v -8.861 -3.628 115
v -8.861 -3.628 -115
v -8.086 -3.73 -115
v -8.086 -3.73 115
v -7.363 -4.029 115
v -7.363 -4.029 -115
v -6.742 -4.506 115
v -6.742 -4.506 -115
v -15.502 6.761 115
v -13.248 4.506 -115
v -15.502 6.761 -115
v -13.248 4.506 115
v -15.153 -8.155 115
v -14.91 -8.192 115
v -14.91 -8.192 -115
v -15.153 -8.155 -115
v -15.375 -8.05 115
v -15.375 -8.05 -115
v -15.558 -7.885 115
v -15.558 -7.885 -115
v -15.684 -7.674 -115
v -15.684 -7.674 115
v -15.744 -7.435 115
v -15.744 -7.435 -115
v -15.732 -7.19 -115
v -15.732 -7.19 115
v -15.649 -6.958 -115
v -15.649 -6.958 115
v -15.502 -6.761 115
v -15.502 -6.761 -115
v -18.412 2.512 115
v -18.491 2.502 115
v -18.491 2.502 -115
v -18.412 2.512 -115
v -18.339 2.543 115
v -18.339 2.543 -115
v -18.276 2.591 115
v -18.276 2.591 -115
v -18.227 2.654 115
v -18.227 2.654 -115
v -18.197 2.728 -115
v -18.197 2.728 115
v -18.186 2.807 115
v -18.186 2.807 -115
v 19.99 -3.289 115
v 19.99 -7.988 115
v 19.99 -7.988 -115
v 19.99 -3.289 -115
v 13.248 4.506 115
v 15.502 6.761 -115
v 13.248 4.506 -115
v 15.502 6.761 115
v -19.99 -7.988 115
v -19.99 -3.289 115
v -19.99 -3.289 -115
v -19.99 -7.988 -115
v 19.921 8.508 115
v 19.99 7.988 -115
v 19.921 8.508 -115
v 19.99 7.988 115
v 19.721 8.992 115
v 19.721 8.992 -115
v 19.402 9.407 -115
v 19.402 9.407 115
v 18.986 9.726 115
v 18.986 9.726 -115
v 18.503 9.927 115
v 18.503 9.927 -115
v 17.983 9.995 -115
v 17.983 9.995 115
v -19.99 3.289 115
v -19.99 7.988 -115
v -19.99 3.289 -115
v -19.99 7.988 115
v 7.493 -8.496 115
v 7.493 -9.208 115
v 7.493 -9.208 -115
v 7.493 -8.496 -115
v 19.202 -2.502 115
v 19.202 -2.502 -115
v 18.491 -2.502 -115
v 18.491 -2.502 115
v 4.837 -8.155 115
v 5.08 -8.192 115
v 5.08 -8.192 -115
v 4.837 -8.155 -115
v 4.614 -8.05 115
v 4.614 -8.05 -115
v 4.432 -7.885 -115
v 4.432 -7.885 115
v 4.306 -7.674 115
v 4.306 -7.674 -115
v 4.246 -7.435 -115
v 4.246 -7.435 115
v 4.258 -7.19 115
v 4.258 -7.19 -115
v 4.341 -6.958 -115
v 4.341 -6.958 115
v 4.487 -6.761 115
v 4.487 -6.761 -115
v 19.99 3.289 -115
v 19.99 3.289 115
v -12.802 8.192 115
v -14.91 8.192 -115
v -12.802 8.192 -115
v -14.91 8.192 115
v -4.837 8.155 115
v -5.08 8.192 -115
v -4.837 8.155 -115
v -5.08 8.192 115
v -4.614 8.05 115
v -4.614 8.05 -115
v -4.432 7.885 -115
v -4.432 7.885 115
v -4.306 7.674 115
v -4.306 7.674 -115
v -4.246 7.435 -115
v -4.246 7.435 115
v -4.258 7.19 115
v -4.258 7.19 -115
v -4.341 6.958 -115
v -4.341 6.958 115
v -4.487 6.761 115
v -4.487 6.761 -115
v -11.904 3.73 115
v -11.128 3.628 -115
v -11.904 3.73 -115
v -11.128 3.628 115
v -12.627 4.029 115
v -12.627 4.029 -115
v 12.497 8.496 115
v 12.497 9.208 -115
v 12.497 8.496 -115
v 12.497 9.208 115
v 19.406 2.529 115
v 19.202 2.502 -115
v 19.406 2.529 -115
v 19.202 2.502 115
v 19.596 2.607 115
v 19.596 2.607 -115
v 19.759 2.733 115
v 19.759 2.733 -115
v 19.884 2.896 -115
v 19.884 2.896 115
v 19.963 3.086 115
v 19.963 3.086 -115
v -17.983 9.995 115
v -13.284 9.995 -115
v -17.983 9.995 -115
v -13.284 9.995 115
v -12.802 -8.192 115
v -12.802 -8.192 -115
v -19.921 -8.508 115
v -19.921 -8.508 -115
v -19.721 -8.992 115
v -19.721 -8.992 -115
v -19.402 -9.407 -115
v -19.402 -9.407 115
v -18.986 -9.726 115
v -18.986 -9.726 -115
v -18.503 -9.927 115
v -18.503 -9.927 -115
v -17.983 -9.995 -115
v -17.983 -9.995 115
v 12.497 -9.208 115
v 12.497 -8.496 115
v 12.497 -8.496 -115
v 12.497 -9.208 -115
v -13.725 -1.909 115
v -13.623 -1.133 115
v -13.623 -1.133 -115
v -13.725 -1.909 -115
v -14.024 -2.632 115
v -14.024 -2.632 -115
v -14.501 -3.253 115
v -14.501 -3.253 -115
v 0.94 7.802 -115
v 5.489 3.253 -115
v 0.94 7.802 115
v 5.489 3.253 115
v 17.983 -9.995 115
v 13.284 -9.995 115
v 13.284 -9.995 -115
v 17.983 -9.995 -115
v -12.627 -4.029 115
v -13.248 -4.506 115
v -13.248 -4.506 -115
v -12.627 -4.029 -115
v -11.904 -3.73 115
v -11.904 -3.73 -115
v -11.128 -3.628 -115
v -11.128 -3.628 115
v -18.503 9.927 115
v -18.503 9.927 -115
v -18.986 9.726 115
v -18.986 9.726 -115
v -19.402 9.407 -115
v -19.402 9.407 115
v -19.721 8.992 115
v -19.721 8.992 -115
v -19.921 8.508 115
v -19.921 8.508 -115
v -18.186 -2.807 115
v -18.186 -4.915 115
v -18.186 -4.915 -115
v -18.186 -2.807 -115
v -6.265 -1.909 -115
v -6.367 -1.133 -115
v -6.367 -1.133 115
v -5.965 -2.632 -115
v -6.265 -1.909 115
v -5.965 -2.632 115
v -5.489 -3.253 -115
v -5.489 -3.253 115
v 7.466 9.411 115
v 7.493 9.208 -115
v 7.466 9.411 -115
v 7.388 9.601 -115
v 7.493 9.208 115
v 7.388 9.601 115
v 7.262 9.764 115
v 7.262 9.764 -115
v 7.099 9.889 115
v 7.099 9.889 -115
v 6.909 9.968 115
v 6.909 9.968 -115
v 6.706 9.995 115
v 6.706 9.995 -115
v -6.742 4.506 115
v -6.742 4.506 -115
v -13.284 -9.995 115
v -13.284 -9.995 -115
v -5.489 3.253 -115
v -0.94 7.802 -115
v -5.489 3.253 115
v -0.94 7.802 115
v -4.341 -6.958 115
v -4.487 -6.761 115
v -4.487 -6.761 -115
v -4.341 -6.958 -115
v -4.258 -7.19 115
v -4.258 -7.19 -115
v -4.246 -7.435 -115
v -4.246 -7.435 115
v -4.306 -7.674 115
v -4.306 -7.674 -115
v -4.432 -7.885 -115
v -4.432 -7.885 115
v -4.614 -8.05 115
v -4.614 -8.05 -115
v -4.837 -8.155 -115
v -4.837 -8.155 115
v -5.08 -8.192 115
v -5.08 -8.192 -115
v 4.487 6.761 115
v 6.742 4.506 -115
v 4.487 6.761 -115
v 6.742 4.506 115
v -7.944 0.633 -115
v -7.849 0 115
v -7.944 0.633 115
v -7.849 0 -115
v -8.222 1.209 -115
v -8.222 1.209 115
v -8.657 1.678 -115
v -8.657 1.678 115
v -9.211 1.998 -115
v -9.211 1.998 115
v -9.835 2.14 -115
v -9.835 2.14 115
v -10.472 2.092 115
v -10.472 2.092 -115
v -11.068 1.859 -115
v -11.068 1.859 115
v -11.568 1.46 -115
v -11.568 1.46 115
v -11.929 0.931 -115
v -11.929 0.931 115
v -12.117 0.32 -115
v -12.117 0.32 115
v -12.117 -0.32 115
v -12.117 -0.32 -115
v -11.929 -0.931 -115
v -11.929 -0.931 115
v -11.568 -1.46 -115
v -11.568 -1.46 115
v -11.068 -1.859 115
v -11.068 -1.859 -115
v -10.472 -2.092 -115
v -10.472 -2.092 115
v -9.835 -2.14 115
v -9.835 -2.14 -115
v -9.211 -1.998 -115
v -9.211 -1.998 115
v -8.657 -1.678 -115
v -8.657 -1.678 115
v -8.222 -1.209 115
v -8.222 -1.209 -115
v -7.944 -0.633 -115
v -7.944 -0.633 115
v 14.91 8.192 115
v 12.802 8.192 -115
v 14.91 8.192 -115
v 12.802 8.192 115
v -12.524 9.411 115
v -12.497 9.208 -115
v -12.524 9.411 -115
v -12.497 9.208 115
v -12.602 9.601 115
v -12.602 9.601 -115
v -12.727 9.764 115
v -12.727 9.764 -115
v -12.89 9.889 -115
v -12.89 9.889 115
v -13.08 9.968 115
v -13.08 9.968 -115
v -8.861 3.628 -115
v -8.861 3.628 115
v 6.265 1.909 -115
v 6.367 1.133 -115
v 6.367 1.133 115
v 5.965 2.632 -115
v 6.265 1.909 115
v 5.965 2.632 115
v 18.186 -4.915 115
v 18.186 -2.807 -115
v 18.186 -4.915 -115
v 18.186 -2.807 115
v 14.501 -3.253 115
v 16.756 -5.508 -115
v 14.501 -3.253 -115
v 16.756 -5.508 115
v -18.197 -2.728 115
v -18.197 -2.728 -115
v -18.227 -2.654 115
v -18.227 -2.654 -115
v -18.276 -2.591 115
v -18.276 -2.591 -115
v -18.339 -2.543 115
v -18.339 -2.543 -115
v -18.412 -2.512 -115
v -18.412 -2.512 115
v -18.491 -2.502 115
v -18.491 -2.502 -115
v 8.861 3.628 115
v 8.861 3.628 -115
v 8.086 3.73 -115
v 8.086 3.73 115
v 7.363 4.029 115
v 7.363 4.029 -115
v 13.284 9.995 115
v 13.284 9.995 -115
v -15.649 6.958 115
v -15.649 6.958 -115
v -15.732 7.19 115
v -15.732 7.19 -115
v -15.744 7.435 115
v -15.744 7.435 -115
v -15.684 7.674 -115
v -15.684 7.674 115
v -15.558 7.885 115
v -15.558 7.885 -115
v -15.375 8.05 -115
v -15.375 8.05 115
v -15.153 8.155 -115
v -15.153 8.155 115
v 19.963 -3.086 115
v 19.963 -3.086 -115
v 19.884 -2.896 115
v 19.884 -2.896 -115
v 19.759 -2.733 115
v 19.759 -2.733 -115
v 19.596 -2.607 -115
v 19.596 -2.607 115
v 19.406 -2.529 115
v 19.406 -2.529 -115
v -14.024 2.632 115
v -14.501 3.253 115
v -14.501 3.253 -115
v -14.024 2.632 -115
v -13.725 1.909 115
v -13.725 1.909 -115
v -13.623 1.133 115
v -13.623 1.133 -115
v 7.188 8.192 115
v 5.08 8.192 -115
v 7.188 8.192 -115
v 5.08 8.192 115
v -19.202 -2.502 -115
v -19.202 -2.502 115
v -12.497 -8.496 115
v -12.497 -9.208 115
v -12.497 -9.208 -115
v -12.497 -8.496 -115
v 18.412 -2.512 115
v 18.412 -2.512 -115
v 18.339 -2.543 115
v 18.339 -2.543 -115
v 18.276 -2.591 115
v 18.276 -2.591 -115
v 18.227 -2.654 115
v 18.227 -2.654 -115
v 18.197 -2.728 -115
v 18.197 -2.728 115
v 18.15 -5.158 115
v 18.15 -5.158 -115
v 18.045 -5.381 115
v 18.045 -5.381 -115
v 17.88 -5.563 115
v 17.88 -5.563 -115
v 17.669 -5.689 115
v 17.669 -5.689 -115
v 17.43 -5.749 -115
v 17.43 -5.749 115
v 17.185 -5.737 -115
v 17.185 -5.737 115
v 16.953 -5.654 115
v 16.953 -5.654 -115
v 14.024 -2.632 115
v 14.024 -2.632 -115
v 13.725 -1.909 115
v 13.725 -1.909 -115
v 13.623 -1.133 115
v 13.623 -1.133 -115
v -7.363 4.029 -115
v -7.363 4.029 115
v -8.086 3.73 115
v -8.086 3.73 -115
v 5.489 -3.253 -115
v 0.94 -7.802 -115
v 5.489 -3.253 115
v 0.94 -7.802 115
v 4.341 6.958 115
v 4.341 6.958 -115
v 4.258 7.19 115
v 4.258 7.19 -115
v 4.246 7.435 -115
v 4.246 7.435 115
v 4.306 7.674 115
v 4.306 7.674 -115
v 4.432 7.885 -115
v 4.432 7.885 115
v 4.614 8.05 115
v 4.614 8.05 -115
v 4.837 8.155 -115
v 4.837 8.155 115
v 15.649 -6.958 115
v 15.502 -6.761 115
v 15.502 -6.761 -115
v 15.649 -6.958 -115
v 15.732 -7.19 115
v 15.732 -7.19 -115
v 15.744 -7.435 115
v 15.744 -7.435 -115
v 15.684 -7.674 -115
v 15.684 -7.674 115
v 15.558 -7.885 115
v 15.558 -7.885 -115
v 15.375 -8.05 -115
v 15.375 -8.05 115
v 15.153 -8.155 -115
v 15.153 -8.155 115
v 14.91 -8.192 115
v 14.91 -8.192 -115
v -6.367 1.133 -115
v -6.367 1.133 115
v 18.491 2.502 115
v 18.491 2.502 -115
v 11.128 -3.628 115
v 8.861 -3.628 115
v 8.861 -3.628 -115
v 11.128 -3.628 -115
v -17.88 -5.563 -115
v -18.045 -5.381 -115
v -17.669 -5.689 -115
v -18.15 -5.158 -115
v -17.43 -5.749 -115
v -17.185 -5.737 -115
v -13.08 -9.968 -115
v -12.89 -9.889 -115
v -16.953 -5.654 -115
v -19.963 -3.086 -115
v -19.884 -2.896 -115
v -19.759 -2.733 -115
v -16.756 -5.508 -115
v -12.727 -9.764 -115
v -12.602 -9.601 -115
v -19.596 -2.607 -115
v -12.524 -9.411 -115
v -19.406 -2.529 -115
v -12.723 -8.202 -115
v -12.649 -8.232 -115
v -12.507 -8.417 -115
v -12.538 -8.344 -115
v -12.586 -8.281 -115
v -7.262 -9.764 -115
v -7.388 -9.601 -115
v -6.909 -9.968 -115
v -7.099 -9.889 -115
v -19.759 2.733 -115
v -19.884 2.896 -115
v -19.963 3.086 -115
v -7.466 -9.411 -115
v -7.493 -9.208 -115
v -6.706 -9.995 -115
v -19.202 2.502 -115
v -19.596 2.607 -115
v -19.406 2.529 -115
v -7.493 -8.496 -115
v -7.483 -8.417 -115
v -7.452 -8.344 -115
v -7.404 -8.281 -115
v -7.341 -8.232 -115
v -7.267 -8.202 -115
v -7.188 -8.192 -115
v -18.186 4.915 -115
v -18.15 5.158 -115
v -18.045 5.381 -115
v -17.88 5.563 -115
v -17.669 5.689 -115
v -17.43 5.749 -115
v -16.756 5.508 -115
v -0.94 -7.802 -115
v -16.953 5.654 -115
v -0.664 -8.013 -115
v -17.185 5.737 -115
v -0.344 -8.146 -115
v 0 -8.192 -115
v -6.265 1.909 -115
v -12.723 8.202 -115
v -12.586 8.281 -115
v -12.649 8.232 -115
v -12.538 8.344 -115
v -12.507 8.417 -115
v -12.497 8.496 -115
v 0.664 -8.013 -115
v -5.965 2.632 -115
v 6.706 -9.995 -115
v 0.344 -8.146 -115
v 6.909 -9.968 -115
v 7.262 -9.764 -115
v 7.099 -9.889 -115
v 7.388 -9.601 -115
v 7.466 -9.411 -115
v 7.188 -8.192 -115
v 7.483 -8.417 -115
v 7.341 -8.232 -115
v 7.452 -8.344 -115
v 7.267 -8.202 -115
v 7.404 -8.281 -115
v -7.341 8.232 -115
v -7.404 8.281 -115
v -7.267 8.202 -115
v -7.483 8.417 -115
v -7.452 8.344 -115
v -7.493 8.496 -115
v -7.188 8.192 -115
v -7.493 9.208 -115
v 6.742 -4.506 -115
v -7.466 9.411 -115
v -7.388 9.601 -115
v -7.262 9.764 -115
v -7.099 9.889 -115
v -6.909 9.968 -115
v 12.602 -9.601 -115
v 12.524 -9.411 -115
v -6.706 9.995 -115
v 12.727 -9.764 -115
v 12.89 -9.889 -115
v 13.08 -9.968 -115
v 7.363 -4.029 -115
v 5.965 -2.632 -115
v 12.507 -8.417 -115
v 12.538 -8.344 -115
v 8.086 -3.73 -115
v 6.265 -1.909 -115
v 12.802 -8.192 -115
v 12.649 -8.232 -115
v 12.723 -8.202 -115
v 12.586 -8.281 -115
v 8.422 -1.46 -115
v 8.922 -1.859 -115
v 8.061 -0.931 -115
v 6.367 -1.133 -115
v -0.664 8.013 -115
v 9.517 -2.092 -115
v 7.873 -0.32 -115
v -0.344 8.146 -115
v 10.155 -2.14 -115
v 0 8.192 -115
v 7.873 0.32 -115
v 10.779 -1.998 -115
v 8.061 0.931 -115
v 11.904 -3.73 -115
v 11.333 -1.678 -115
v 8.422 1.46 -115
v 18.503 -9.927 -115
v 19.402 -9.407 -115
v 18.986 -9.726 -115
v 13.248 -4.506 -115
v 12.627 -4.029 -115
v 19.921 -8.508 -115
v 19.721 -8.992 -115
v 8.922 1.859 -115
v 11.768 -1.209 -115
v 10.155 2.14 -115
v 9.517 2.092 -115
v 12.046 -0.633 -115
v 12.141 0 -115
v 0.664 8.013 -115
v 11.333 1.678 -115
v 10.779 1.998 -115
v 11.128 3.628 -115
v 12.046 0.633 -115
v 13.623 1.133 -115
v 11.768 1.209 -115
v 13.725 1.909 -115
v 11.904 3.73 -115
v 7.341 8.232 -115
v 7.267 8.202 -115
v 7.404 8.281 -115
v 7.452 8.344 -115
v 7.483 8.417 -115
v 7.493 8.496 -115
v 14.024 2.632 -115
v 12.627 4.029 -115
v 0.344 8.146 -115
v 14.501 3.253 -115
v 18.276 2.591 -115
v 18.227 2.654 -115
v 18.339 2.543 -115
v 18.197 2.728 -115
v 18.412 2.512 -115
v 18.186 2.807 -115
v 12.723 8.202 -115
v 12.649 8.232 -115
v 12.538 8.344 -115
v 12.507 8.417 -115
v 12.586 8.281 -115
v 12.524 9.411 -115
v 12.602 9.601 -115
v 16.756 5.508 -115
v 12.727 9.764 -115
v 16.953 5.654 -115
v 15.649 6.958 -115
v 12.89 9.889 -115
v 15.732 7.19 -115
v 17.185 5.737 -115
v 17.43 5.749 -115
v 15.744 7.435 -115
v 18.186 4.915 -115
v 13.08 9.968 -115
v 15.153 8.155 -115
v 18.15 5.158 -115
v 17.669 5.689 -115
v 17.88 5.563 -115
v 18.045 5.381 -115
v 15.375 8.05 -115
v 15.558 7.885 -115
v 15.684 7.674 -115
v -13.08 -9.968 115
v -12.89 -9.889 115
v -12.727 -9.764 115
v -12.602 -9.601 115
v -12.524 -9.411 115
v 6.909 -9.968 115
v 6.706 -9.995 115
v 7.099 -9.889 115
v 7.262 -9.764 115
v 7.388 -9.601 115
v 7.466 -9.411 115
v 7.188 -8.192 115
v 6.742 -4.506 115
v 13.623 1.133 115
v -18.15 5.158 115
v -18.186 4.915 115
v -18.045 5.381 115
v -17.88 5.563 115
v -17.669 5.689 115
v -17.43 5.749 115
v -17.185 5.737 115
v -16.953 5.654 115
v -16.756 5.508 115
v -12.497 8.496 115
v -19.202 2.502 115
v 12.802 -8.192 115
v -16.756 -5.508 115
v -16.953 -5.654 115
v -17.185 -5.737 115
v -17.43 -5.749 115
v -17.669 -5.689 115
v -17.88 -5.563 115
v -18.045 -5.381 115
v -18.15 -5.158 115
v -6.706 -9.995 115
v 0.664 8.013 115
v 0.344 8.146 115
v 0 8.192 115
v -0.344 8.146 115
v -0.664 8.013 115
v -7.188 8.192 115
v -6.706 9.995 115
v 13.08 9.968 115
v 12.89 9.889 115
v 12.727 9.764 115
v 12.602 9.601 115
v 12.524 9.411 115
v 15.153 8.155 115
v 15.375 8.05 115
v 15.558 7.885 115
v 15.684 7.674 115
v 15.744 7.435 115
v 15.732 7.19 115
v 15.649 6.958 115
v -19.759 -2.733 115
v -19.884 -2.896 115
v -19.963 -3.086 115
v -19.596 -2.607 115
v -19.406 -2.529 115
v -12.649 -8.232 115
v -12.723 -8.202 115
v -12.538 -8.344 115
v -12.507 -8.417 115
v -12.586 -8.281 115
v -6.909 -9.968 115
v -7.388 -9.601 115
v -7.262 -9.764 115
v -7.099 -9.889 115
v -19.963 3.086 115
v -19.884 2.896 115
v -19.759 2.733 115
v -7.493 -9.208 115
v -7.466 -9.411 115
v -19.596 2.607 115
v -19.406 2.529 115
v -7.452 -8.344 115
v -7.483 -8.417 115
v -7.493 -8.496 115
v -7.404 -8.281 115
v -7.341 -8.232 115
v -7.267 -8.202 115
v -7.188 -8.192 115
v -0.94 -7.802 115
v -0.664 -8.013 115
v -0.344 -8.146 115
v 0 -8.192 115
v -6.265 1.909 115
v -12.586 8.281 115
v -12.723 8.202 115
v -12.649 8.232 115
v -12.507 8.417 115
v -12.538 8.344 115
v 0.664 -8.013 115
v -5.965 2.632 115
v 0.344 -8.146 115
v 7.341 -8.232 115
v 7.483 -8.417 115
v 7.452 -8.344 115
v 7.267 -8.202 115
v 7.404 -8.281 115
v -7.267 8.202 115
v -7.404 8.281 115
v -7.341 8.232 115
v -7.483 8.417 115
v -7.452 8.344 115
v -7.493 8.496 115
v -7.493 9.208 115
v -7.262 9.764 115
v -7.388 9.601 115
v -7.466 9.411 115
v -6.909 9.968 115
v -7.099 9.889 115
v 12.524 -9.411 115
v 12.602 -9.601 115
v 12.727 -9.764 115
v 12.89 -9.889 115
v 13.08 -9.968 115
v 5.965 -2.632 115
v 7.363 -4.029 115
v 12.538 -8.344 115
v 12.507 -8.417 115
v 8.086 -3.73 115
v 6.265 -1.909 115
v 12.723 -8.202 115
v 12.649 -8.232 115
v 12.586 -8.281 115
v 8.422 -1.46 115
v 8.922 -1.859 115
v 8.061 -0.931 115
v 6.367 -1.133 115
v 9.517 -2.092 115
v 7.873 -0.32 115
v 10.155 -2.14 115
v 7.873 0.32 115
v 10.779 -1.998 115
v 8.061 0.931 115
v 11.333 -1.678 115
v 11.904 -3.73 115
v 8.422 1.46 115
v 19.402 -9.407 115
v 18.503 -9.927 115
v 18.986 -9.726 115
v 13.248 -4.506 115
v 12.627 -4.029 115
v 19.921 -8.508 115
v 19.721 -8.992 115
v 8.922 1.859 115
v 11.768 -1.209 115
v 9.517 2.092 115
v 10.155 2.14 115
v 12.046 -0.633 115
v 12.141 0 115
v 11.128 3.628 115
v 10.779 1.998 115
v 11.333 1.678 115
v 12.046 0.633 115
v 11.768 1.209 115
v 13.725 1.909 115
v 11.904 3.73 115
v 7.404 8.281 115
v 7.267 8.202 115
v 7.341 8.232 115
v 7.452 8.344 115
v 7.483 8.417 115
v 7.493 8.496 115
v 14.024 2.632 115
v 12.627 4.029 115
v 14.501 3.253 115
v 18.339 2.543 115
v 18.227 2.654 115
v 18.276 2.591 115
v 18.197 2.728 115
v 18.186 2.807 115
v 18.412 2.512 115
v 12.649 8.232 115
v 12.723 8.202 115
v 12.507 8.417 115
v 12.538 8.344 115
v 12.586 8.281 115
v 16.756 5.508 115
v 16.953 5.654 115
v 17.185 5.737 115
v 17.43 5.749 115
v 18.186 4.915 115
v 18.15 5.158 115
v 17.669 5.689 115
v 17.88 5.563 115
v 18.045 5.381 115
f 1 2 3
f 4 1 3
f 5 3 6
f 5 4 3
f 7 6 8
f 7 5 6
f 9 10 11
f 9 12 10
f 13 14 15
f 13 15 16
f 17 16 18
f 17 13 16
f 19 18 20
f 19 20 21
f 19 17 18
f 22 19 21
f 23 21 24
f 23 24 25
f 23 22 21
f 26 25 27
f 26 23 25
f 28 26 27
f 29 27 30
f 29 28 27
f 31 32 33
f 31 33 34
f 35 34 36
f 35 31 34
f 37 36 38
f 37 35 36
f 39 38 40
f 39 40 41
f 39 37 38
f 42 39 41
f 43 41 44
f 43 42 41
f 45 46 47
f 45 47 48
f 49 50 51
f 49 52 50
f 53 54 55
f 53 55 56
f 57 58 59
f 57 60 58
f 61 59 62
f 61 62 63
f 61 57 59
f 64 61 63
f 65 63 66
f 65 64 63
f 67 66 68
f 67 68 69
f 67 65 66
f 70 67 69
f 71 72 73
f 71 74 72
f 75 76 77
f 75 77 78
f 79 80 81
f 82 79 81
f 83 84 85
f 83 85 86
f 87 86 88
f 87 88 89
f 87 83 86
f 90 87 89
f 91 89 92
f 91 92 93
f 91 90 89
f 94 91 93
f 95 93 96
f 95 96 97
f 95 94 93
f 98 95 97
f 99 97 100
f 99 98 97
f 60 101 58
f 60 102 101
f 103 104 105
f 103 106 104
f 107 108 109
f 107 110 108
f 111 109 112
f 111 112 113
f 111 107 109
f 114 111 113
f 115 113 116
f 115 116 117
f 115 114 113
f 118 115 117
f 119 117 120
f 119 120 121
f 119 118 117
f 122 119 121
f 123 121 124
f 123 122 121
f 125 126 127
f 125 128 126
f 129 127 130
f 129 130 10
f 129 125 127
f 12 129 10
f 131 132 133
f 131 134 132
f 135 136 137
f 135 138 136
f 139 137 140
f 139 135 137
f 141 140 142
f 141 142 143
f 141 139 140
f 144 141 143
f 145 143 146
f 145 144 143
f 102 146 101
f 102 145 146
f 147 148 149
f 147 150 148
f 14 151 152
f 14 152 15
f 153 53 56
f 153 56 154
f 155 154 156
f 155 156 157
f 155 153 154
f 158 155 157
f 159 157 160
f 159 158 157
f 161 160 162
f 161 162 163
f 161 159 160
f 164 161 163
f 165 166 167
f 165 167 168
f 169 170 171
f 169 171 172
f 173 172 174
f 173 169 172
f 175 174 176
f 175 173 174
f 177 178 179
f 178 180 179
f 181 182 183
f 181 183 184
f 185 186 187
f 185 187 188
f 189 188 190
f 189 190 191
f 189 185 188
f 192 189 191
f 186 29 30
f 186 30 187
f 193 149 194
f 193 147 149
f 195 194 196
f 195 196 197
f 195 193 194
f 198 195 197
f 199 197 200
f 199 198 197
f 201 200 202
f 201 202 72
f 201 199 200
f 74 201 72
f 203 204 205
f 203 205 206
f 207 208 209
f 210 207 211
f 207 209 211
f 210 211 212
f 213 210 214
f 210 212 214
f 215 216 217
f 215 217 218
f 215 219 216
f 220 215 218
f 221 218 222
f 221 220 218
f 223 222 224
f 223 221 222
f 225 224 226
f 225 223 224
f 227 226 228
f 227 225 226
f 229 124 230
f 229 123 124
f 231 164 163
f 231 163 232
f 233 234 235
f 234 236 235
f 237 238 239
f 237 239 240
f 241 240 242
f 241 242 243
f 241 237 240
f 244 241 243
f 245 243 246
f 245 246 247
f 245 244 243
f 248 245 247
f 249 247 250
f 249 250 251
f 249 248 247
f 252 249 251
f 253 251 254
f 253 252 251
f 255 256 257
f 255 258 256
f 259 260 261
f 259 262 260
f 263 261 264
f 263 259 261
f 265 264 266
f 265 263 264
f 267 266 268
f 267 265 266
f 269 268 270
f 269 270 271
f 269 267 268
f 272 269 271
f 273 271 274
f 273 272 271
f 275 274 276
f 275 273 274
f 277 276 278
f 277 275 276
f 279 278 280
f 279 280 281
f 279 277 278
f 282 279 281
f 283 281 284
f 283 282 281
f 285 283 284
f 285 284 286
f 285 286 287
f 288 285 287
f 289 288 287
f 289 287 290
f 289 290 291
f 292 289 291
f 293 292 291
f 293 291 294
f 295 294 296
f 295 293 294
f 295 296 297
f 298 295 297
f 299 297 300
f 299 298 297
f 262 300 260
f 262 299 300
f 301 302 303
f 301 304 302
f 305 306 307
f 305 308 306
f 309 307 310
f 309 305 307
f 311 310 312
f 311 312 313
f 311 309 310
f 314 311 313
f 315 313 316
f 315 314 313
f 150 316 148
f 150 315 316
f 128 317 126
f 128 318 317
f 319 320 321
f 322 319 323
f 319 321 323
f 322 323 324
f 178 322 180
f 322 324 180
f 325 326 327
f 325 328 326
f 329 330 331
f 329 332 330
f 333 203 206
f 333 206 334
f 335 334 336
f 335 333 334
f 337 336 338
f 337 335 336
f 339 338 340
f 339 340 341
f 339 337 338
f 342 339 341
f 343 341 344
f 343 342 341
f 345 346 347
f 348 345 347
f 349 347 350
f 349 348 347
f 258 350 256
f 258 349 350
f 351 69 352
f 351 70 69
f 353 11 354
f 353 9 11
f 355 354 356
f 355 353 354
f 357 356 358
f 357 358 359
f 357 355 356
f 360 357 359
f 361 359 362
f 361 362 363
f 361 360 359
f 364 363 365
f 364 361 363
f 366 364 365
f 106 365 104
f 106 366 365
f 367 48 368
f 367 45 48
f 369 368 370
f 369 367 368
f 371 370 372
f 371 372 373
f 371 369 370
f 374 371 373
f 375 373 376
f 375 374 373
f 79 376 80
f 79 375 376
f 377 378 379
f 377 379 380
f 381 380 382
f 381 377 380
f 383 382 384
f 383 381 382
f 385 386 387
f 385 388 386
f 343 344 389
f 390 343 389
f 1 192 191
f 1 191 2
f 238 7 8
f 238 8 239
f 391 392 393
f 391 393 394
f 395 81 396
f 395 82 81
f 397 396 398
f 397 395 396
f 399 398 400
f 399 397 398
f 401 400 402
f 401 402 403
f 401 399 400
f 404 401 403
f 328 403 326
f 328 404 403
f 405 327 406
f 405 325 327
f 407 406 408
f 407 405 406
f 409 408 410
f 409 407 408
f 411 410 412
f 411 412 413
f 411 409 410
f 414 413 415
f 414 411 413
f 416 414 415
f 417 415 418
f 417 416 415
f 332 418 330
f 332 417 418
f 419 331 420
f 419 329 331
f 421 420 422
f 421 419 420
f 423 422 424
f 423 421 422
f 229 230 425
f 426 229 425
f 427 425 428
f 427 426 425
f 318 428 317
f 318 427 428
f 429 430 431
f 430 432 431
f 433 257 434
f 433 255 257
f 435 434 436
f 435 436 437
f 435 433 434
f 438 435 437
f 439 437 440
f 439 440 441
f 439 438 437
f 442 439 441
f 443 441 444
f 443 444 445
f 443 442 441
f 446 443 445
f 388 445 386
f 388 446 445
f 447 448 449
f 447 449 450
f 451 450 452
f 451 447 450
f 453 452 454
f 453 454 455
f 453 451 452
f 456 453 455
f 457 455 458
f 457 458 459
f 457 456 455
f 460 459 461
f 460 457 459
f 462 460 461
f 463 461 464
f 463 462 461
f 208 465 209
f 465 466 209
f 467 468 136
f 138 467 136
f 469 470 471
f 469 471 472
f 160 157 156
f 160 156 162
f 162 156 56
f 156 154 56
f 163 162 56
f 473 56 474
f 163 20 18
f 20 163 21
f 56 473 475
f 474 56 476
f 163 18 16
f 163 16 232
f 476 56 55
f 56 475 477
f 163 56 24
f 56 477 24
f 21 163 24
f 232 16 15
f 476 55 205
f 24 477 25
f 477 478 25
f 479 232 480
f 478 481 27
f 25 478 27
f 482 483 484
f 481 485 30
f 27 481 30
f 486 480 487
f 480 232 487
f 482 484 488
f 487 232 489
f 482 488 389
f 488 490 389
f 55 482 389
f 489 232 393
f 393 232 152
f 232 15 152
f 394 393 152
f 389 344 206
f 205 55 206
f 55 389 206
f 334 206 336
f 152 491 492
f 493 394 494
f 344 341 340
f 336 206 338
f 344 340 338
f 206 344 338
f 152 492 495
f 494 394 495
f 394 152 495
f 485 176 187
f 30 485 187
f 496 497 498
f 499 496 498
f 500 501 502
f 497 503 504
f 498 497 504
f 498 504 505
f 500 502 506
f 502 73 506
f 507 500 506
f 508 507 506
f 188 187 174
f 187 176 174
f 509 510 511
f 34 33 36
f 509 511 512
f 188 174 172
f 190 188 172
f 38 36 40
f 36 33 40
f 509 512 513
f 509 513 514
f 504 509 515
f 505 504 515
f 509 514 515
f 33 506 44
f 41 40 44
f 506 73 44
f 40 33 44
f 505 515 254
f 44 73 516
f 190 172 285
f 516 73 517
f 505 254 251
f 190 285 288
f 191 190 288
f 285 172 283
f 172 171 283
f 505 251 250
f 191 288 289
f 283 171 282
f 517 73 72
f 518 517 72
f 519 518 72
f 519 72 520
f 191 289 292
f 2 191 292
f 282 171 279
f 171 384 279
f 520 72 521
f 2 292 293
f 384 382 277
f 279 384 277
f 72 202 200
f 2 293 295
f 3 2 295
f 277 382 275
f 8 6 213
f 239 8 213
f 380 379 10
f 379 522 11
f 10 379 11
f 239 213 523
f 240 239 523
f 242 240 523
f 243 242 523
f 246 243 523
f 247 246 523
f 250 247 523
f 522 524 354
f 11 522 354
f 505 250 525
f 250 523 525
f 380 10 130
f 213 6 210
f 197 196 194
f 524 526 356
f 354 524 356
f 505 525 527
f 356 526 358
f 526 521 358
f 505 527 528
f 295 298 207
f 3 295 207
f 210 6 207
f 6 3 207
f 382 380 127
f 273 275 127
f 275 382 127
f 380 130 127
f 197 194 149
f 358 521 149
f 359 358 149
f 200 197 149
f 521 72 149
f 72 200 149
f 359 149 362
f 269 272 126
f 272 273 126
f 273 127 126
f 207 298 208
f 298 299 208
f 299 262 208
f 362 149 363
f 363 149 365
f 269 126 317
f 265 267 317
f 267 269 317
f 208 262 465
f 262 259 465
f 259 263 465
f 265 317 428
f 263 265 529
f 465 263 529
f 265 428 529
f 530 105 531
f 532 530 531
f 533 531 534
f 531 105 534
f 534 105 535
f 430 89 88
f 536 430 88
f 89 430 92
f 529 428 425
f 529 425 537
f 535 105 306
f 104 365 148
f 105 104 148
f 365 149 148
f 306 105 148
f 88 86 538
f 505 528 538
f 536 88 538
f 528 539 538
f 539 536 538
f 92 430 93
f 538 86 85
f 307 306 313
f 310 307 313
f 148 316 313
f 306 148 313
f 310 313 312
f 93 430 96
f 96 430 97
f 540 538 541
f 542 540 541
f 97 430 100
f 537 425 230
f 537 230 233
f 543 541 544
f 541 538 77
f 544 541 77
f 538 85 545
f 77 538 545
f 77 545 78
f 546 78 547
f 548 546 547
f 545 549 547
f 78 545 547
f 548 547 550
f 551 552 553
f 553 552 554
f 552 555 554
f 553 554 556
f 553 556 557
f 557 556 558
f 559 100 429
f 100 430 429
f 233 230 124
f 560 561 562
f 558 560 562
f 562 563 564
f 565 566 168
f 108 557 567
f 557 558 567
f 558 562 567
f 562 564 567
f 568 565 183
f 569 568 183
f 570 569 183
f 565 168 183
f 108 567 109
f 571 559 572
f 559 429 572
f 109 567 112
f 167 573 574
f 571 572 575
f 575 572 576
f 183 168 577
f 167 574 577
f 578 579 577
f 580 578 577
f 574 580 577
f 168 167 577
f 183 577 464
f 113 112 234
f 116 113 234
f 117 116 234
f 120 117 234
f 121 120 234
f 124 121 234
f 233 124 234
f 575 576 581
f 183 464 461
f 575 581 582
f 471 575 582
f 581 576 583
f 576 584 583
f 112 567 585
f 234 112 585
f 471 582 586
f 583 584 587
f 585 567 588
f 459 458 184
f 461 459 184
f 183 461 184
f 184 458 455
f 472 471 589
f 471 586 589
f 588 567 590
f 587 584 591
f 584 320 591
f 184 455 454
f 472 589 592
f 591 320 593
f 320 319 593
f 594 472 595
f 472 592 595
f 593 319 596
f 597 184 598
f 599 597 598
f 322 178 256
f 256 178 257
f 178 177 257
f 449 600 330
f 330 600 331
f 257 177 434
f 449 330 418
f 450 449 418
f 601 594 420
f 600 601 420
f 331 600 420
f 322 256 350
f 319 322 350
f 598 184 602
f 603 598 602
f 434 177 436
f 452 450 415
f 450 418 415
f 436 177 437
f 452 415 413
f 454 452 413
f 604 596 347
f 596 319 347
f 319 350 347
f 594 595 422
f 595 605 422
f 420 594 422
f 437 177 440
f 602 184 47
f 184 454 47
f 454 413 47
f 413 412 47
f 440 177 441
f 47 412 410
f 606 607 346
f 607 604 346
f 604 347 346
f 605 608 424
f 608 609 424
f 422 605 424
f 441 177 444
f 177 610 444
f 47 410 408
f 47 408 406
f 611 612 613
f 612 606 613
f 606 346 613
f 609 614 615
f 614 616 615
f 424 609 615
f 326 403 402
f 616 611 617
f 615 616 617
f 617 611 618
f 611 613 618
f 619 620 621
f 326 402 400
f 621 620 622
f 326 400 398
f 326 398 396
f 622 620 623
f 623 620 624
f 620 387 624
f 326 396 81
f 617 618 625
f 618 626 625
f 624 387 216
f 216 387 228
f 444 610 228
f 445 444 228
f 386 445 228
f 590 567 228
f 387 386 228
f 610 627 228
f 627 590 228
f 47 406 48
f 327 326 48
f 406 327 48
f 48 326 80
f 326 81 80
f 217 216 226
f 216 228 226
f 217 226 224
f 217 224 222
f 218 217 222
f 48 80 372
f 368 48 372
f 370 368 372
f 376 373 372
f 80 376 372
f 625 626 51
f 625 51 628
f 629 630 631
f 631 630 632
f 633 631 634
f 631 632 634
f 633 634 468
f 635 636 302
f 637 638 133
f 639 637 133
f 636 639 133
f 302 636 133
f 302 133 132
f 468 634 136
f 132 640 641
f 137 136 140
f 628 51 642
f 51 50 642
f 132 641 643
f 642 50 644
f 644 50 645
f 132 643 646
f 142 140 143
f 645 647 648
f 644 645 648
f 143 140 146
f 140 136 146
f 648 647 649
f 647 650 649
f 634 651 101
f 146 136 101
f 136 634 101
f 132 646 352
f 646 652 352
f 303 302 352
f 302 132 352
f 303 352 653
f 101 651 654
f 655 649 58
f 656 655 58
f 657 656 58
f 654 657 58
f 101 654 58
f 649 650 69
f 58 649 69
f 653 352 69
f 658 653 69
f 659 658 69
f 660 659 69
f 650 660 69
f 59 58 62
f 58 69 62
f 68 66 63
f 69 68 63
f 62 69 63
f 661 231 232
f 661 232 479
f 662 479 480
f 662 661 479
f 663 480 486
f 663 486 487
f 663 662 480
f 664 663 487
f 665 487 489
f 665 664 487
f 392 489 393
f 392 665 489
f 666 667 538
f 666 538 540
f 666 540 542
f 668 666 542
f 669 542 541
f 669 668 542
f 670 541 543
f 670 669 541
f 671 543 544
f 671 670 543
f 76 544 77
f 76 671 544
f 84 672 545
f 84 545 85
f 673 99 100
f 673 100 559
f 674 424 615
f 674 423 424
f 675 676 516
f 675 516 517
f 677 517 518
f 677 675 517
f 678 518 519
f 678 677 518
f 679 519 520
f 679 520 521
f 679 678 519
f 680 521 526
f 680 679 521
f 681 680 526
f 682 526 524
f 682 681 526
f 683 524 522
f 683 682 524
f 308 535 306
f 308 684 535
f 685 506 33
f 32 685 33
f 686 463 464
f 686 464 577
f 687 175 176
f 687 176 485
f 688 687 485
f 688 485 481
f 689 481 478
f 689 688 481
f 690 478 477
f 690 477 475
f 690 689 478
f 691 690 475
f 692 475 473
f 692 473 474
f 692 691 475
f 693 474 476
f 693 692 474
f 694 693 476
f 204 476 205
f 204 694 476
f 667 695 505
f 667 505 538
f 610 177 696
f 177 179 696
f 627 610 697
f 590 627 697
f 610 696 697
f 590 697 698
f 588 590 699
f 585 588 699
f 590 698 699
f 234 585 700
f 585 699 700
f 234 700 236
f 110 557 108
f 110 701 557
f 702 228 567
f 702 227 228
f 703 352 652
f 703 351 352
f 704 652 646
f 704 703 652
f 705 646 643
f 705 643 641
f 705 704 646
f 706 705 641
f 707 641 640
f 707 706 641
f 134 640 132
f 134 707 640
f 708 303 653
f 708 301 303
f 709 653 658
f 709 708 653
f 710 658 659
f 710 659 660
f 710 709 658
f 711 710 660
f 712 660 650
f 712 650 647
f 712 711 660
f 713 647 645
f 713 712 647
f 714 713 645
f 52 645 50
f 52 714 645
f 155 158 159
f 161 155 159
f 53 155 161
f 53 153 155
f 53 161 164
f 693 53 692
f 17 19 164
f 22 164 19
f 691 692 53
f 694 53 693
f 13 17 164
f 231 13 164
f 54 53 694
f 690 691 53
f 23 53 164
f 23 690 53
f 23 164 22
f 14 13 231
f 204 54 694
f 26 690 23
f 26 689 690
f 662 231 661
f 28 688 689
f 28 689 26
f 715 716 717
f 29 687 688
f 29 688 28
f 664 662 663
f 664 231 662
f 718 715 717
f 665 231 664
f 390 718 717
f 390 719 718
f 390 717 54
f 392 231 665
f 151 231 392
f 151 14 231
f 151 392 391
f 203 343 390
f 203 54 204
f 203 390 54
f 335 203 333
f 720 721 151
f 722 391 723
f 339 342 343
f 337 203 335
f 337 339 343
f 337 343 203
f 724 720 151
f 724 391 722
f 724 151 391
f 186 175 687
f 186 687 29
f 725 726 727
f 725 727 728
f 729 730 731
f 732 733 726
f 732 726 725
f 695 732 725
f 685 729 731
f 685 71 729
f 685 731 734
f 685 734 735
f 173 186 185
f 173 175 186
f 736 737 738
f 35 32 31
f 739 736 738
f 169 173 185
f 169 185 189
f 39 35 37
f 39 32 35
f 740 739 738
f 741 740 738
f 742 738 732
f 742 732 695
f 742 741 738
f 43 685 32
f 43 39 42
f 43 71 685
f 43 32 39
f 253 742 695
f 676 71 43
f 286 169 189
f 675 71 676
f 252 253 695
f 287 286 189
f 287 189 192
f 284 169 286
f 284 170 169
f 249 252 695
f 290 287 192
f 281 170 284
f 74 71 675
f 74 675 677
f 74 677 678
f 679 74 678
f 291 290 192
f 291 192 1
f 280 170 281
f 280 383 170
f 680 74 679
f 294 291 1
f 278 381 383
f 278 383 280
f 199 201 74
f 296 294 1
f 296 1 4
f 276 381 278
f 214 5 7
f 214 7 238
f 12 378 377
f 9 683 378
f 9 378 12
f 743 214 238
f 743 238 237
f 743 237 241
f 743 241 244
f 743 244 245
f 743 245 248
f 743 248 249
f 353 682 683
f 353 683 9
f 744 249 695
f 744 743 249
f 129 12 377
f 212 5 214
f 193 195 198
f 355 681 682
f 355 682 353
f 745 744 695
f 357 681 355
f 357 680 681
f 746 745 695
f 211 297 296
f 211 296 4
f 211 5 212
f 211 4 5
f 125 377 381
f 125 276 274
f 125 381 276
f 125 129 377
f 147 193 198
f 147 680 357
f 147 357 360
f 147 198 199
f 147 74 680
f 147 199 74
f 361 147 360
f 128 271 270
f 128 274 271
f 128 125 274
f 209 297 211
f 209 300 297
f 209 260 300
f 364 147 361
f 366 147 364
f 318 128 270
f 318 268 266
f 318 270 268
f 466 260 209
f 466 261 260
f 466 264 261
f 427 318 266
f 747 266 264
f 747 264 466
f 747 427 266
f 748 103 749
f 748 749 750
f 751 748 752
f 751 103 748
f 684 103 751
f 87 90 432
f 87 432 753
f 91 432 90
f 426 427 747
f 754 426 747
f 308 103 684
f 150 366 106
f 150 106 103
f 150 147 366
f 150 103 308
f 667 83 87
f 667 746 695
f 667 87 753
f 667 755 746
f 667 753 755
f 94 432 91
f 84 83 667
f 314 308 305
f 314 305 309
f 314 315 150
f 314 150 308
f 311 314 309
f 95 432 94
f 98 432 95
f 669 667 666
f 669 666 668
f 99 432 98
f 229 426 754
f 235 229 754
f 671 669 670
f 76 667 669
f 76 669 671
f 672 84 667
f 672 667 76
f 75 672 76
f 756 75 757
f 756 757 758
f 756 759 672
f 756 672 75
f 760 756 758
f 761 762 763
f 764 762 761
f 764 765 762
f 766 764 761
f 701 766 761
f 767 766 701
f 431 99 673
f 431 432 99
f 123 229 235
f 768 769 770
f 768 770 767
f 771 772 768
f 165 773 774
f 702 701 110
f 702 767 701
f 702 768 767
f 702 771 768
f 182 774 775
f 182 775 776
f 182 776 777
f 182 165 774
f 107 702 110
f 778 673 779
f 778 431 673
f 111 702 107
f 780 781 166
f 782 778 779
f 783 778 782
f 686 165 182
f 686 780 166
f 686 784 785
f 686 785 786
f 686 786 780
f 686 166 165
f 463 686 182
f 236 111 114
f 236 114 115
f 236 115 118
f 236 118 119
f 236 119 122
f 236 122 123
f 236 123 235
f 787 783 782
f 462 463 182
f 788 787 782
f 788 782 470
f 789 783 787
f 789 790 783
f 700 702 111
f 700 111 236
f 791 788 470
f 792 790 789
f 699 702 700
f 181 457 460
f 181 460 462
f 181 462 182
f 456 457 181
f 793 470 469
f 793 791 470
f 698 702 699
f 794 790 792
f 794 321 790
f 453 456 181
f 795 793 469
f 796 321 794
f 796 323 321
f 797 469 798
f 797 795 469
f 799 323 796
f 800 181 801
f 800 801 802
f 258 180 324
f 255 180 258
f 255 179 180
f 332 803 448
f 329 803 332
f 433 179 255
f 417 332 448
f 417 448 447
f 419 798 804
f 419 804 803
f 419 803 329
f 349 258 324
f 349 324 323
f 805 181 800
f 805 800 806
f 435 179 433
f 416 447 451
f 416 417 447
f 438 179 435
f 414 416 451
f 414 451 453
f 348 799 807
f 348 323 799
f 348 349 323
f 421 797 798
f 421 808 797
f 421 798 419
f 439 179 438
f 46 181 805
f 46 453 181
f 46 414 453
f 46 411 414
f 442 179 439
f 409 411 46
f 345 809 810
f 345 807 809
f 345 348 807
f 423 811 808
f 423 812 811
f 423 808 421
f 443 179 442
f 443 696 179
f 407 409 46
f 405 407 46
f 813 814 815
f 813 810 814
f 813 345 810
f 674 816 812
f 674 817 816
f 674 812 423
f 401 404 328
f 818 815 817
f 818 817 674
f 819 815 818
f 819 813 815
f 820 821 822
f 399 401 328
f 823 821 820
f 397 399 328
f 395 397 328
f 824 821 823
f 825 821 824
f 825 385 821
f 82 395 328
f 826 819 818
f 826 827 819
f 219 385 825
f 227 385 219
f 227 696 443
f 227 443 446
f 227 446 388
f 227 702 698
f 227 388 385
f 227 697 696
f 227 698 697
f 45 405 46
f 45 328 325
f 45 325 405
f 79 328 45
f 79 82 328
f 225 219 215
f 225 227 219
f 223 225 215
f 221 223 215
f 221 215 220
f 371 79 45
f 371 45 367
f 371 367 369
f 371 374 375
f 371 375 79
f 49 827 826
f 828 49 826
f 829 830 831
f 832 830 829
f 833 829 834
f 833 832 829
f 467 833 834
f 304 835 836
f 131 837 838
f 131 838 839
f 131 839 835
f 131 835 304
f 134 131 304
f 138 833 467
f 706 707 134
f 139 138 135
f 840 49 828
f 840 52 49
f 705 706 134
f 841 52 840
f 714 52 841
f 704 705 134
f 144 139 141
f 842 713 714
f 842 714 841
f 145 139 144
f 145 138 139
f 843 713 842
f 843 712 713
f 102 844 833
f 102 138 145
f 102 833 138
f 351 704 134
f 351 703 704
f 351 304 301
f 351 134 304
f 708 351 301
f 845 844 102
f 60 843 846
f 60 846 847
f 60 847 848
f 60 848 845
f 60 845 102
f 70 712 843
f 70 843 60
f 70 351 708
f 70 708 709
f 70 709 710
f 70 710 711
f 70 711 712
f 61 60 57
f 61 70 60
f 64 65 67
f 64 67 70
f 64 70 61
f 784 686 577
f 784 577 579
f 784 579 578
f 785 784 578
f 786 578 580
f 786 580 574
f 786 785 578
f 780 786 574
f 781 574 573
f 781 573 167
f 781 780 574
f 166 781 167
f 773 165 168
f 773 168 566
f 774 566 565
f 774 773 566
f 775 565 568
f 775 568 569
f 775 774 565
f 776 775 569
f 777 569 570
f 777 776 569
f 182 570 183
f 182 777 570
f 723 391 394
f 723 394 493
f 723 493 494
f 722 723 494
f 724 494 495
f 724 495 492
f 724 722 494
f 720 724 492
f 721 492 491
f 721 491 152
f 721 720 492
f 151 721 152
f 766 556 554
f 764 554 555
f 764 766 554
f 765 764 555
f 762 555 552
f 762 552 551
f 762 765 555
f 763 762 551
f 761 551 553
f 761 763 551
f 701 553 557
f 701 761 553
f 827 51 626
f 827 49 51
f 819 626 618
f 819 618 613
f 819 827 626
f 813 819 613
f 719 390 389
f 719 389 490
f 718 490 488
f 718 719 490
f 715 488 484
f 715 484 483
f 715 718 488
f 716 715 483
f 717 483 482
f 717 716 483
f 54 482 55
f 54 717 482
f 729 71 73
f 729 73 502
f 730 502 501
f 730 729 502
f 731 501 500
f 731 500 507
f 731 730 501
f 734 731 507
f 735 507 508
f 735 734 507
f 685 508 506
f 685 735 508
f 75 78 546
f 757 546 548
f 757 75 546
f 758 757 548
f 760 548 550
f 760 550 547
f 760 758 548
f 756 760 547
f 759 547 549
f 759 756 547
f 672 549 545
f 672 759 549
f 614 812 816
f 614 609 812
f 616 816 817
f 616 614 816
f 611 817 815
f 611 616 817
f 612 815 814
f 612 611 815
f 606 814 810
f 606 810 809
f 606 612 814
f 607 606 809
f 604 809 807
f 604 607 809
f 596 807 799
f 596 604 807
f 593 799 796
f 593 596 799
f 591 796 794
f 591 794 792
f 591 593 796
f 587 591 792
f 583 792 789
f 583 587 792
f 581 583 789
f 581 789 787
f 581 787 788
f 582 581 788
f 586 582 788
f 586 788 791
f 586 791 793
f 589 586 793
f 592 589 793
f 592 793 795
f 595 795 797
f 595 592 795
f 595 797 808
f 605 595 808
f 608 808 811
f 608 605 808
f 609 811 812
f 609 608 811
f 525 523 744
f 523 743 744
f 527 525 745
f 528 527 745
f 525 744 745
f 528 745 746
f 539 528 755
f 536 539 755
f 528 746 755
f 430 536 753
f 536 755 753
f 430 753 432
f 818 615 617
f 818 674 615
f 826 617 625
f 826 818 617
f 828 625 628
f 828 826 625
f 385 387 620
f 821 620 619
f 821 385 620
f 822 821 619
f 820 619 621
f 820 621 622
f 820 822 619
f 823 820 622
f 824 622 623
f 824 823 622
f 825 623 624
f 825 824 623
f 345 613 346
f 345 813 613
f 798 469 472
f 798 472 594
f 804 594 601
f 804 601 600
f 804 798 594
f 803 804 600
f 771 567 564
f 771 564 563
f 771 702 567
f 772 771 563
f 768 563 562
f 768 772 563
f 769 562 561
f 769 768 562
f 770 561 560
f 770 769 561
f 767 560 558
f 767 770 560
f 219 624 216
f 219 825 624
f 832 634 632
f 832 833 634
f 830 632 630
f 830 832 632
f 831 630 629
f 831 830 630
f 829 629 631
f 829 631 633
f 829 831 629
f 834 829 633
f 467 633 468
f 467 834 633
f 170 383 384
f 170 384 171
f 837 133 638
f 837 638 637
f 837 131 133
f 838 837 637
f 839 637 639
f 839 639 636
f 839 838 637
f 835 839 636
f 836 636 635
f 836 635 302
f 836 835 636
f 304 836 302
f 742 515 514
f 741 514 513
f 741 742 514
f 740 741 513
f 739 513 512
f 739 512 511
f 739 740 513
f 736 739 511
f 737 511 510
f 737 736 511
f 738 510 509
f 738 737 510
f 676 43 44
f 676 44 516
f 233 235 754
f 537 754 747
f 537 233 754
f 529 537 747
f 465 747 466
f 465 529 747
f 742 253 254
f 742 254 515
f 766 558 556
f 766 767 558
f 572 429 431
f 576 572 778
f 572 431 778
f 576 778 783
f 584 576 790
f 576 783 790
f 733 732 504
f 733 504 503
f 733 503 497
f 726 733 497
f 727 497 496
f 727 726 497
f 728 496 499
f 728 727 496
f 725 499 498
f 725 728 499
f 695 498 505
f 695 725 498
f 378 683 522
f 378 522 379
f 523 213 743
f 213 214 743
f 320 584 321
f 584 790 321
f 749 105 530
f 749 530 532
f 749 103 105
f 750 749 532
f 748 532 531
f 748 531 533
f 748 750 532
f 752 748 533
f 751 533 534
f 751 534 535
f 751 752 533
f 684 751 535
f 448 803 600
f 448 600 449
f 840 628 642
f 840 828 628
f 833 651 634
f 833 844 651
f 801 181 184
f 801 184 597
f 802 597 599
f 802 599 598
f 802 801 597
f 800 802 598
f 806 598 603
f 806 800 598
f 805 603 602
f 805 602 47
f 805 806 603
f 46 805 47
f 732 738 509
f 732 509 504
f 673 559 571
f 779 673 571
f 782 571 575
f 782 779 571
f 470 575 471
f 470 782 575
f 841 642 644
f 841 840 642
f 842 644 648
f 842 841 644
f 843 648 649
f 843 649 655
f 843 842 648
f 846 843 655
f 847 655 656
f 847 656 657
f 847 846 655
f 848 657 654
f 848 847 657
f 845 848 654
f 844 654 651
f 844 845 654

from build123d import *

# Parameters (mm, degrees)
SKETCH1_R           = 2.1463
BOSS_EXTRUDE1_DEPTH = 115


with BuildPart() as part:
    # Sketch1 → Boss-Extrude1 (new body, symmetric)
    with BuildSketch(Plane.XY):
        with BuildLine():
            Line((-19.9898, 7.9883), (-19.9898, 3.2893))
            ThreePointArc((-19.9898, 3.2893), (-19.75917588, 2.73252412), (-19.2024, 2.5019))
            Line((-19.2024, 2.5019), (-18.4912, 2.5019))
            ThreePointArc((-18.4912, 2.5019), (-18.275673853, 2.591173853), (-18.1864, 2.8067))
            Line((-18.1864, 2.8067), (-18.1864, 4.9149))
            ThreePointArc((-18.1864, 4.9149), (-17.668965253, 5.689295824), (-16.755503096, 5.507596904))
            Line((-16.755503096, 5.507596904), (-14.500665747, 3.252759555))
            ThreePointArc((-14.500665747, 3.252759555), (-13.850954457, 2.280397894), (-13.622806192, 1.133419111))
            Line((-13.622806192, 1.133419111), (-13.622806192, -1.133419111))
            ThreePointArc((-13.622806192, -1.133419111), (-13.850954457, -2.280397894), (-14.500665747, -3.252759555))
            Line((-14.500665747, -3.252759555), (-16.755503096, -5.507596904))
            ThreePointArc((-16.755503096, -5.507596904), (-17.668965253, -5.689295824), (-18.1864, -4.9149))
            Line((-18.1864, -4.9149), (-18.1864, -2.8067))
            ThreePointArc((-18.1864, -2.8067), (-18.275673853, -2.591173853), (-18.4912, -2.5019))
            Line((-18.4912, -2.5019), (-19.2024, -2.5019))
            ThreePointArc((-19.2024, -2.5019), (-19.75917588, -2.73252412), (-19.9898, -3.2893))
            Line((-19.9898, -3.2893), (-19.9898, -7.9883))
            ThreePointArc((-19.9898, -7.9883), (-19.402080467, -9.407180467), (-17.9832, -9.9949))
            Line((-17.9832, -9.9949), (-13.2842, -9.9949))
            ThreePointArc((-13.2842, -9.9949), (-12.72742412, -9.76427588), (-12.4968, -9.2075))
            Line((-12.4968, -9.2075), (-12.4968, -8.4963))
            ThreePointArc((-12.4968, -8.4963), (-12.586073853, -8.280773853), (-12.8016, -8.1915))
            Line((-12.8016, -8.1915), (-14.9098, -8.1915))
            ThreePointArc((-14.9098, -8.1915), (-15.684195824, -7.674065253), (-15.502496904, -6.760603096))
            Line((-15.502496904, -6.760603096), (-13.247659555, -4.505765747))
            ThreePointArc((-13.247659555, -4.505765747), (-12.275297894, -3.856054457), (-11.128319111, -3.627906192))
            Line((-11.128319111, -3.627906192), (-8.861480889, -3.627906192))
            ThreePointArc((-8.861480889, -3.627906192), (-7.714502106, -3.856054457), (-6.742140445, -4.505765747))
            Line((-6.742140445, -4.505765747), (-4.487303096, -6.760603096))
            ThreePointArc((-4.487303096, -6.760603096), (-4.305604176, -7.674065253), (-5.08, -8.1915))
            Line((-5.08, -8.1915), (-7.1882, -8.1915))
            ThreePointArc((-7.1882, -8.1915), (-7.403726147, -8.280773853), (-7.493, -8.4963))
            Line((-7.493, -8.4963), (-7.493, -9.2075))
            ThreePointArc((-7.493, -9.2075), (-7.26237588, -9.76427588), (-6.7056, -9.9949))
            Line((-6.7056, -9.9949), (0, -9.9949))
            Line((0, -9.9949), (6.7056, -9.9949))
            ThreePointArc((6.7056, -9.9949), (7.26237588, -9.76427588), (7.493, -9.2075))
            Line((7.493, -9.2075), (7.493, -8.4963))
            ThreePointArc((7.493, -8.4963), (7.403726147, -8.280773853), (7.1882, -8.1915))
            Line((7.1882, -8.1915), (5.08, -8.1915))
            ThreePointArc((5.08, -8.1915), (4.305604176, -7.674065253), (4.487303096, -6.760603096))
            Line((4.487303096, -6.760603096), (6.742140445, -4.505765747))
            ThreePointArc((6.742140445, -4.505765747), (7.714502106, -3.856054457), (8.861480889, -3.627906192))
            Line((8.861480889, -3.627906192), (11.128319111, -3.627906192))
            ThreePointArc((11.128319111, -3.627906192), (12.275297894, -3.856054457), (13.247659555, -4.505765747))
            Line((13.247659555, -4.505765747), (15.502496904, -6.760603096))
            ThreePointArc((15.502496904, -6.760603096), (15.684195824, -7.674065253), (14.9098, -8.1915))
            Line((14.9098, -8.1915), (12.8016, -8.1915))
            ThreePointArc((12.8016, -8.1915), (12.586073853, -8.280773853), (12.4968, -8.4963))
            Line((12.4968, -8.4963), (12.4968, -9.2075))
            ThreePointArc((12.4968, -9.2075), (12.72742412, -9.76427588), (13.2842, -9.9949))
            Line((13.2842, -9.9949), (17.9832, -9.9949))
            ThreePointArc((17.9832, -9.9949), (19.402080467, -9.407180467), (19.9898, -7.9883))
            Line((19.9898, -7.9883), (19.9898, -3.2893))
            ThreePointArc((19.9898, -3.2893), (19.75917588, -2.73252412), (19.2024, -2.5019))
            Line((19.2024, -2.5019), (18.4912, -2.5019))
            ThreePointArc((18.4912, -2.5019), (18.275673853, -2.591173853), (18.1864, -2.8067))
            Line((18.1864, -2.8067), (18.1864, -4.9149))
            ThreePointArc((18.1864, -4.9149), (17.668965253, -5.689295824), (16.755503096, -5.507596904))
            Line((16.755503096, -5.507596904), (14.500665747, -3.252759555))
            ThreePointArc((14.500665747, -3.252759555), (13.850954457, -2.280397894), (13.622806192, -1.133419111))
            Line((13.622806192, -1.133419111), (13.622806192, 1.133419111))
            ThreePointArc((13.622806192, 1.133419111), (13.850954457, 2.280397894), (14.500665747, 3.252759555))
            Line((14.500665747, 3.252759555), (16.755503096, 5.507596904))
            ThreePointArc((16.755503096, 5.507596904), (17.668965253, 5.689295824), (18.1864, 4.9149))
            Line((18.1864, 4.9149), (18.1864, 2.8067))
            ThreePointArc((18.1864, 2.8067), (18.275673853, 2.591173853), (18.4912, 2.5019))
            Line((18.4912, 2.5019), (19.2024, 2.5019))
            ThreePointArc((19.2024, 2.5019), (19.75917588, 2.73252412), (19.9898, 3.2893))
            Line((19.9898, 3.2893), (19.9898, 7.9883))
            ThreePointArc((19.9898, 7.9883), (19.402080467, 9.407180467), (17.9832, 9.9949))
            Line((17.9832, 9.9949), (13.2842, 9.9949))
            ThreePointArc((13.2842, 9.9949), (12.72742412, 9.76427588), (12.4968, 9.2075))
            Line((12.4968, 9.2075), (12.4968, 8.4963))
            ThreePointArc((12.4968, 8.4963), (12.586073853, 8.280773853), (12.8016, 8.1915))
            Line((12.8016, 8.1915), (14.9098, 8.1915))
            ThreePointArc((14.9098, 8.1915), (15.684195824, 7.674065253), (15.502496904, 6.760603096))
            Line((15.502496904, 6.760603096), (13.247659555, 4.505765747))
            ThreePointArc((13.247659555, 4.505765747), (12.275297894, 3.856054457), (11.128319111, 3.627906192))
            Line((11.128319111, 3.627906192), (8.861480889, 3.627906192))
            ThreePointArc((8.861480889, 3.627906192), (7.714502106, 3.856054457), (6.742140445, 4.505765747))
            Line((6.742140445, 4.505765747), (4.487303096, 6.760603096))
            ThreePointArc((4.487303096, 6.760603096), (4.305604176, 7.674065253), (5.08, 8.1915))
            Line((5.08, 8.1915), (7.1882, 8.1915))
            ThreePointArc((7.1882, 8.1915), (7.403726147, 8.280773853), (7.493, 8.4963))
            Line((7.493, 8.4963), (7.493, 9.2075))
            ThreePointArc((7.493, 9.2075), (7.26237588, 9.76427588), (6.7056, 9.9949))
            Line((6.7056, 9.9949), (0, 9.9949))
            Line((0, 9.9949), (-6.7056, 9.9949))
            ThreePointArc((-6.7056, 9.9949), (-7.26237588, 9.76427588), (-7.493, 9.2075))
            Line((-7.493, 9.2075), (-7.493, 8.4963))
            ThreePointArc((-7.493, 8.4963), (-7.403726147, 8.280773853), (-7.1882, 8.1915))
            Line((-7.1882, 8.1915), (-5.08, 8.1915))
            ThreePointArc((-5.08, 8.1915), (-4.305604176, 7.674065253), (-4.487303096, 6.760603096))
            Line((-4.487303096, 6.760603096), (-6.742140445, 4.505765747))
            ThreePointArc((-6.742140445, 4.505765747), (-7.714502106, 3.856054457), (-8.861480889, 3.627906192))
            Line((-8.861480889, 3.627906192), (-11.128319111, 3.627906192))
            ThreePointArc((-11.128319111, 3.627906192), (-12.275297894, 3.856054457), (-13.247659555, 4.505765747))
            Line((-13.247659555, 4.505765747), (-15.502496904, 6.760603096))
            ThreePointArc((-15.502496904, 6.760603096), (-15.684195824, 7.674065253), (-14.9098, 8.1915))
            Line((-14.9098, 8.1915), (-12.8016, 8.1915))
            ThreePointArc((-12.8016, 8.1915), (-12.586073853, 8.280773853), (-12.4968, 8.4963))
            Line((-12.4968, 8.4963), (-12.4968, 9.2075))
            ThreePointArc((-12.4968, 9.2075), (-12.72742412, 9.76427588), (-13.2842, 9.9949))
            Line((-13.2842, 9.9949), (-17.9832, 9.9949))
            ThreePointArc((-17.9832, 9.9949), (-19.402080467, 9.407180467), (-19.9898, 7.9883))
        make_face()
        with Locations((-9.9949, 0)):
            Circle(SKETCH1_R, mode=Mode.SUBTRACT)
        with Locations((9.9949, 0)):
            Circle(SKETCH1_R, mode=Mode.SUBTRACT)
        with BuildLine():
            Line((-6.366993808, 1.133419111), (-6.366993808, -1.133419111))
            ThreePointArc((-6.366993808, -1.133419111), (-6.138845543, -2.280397894), (-5.489134253, -3.252759555))
            Line((-5.489134253, -3.252759555), (-0.939581002, -7.802312806))
            ThreePointArc((-0.939581002, -7.802312806), (0, -8.1915), (0.939581002, -7.802312806))
            Line((0.939581002, -7.802312806), (5.489134253, -3.252759555))
            ThreePointArc((5.489134253, -3.252759555), (6.138845543, -2.280397894), (6.366993808, -1.133419111))
            Line((6.366993808, -1.133419111), (6.366993808, 1.133419111))
            ThreePointArc((6.366993808, 1.133419111), (6.138845543, 2.280397894), (5.489134253, 3.252759555))
            Line((5.489134253, 3.252759555), (0.939581002, 7.802312806))
            ThreePointArc((0.939581002, 7.802312806), (0, 8.1915), (-0.939581002, 7.802312806))
            Line((-0.939581002, 7.802312806), (-5.489134253, 3.252759555))
            ThreePointArc((-5.489134253, 3.252759555), (-6.138845543, 2.280397894), (-6.366993808, 1.133419111))
        make_face(mode=Mode.SUBTRACT)
    extrude(amount=BOSS_EXTRUDE1_DEPTH, both=True)


solid = part.part
